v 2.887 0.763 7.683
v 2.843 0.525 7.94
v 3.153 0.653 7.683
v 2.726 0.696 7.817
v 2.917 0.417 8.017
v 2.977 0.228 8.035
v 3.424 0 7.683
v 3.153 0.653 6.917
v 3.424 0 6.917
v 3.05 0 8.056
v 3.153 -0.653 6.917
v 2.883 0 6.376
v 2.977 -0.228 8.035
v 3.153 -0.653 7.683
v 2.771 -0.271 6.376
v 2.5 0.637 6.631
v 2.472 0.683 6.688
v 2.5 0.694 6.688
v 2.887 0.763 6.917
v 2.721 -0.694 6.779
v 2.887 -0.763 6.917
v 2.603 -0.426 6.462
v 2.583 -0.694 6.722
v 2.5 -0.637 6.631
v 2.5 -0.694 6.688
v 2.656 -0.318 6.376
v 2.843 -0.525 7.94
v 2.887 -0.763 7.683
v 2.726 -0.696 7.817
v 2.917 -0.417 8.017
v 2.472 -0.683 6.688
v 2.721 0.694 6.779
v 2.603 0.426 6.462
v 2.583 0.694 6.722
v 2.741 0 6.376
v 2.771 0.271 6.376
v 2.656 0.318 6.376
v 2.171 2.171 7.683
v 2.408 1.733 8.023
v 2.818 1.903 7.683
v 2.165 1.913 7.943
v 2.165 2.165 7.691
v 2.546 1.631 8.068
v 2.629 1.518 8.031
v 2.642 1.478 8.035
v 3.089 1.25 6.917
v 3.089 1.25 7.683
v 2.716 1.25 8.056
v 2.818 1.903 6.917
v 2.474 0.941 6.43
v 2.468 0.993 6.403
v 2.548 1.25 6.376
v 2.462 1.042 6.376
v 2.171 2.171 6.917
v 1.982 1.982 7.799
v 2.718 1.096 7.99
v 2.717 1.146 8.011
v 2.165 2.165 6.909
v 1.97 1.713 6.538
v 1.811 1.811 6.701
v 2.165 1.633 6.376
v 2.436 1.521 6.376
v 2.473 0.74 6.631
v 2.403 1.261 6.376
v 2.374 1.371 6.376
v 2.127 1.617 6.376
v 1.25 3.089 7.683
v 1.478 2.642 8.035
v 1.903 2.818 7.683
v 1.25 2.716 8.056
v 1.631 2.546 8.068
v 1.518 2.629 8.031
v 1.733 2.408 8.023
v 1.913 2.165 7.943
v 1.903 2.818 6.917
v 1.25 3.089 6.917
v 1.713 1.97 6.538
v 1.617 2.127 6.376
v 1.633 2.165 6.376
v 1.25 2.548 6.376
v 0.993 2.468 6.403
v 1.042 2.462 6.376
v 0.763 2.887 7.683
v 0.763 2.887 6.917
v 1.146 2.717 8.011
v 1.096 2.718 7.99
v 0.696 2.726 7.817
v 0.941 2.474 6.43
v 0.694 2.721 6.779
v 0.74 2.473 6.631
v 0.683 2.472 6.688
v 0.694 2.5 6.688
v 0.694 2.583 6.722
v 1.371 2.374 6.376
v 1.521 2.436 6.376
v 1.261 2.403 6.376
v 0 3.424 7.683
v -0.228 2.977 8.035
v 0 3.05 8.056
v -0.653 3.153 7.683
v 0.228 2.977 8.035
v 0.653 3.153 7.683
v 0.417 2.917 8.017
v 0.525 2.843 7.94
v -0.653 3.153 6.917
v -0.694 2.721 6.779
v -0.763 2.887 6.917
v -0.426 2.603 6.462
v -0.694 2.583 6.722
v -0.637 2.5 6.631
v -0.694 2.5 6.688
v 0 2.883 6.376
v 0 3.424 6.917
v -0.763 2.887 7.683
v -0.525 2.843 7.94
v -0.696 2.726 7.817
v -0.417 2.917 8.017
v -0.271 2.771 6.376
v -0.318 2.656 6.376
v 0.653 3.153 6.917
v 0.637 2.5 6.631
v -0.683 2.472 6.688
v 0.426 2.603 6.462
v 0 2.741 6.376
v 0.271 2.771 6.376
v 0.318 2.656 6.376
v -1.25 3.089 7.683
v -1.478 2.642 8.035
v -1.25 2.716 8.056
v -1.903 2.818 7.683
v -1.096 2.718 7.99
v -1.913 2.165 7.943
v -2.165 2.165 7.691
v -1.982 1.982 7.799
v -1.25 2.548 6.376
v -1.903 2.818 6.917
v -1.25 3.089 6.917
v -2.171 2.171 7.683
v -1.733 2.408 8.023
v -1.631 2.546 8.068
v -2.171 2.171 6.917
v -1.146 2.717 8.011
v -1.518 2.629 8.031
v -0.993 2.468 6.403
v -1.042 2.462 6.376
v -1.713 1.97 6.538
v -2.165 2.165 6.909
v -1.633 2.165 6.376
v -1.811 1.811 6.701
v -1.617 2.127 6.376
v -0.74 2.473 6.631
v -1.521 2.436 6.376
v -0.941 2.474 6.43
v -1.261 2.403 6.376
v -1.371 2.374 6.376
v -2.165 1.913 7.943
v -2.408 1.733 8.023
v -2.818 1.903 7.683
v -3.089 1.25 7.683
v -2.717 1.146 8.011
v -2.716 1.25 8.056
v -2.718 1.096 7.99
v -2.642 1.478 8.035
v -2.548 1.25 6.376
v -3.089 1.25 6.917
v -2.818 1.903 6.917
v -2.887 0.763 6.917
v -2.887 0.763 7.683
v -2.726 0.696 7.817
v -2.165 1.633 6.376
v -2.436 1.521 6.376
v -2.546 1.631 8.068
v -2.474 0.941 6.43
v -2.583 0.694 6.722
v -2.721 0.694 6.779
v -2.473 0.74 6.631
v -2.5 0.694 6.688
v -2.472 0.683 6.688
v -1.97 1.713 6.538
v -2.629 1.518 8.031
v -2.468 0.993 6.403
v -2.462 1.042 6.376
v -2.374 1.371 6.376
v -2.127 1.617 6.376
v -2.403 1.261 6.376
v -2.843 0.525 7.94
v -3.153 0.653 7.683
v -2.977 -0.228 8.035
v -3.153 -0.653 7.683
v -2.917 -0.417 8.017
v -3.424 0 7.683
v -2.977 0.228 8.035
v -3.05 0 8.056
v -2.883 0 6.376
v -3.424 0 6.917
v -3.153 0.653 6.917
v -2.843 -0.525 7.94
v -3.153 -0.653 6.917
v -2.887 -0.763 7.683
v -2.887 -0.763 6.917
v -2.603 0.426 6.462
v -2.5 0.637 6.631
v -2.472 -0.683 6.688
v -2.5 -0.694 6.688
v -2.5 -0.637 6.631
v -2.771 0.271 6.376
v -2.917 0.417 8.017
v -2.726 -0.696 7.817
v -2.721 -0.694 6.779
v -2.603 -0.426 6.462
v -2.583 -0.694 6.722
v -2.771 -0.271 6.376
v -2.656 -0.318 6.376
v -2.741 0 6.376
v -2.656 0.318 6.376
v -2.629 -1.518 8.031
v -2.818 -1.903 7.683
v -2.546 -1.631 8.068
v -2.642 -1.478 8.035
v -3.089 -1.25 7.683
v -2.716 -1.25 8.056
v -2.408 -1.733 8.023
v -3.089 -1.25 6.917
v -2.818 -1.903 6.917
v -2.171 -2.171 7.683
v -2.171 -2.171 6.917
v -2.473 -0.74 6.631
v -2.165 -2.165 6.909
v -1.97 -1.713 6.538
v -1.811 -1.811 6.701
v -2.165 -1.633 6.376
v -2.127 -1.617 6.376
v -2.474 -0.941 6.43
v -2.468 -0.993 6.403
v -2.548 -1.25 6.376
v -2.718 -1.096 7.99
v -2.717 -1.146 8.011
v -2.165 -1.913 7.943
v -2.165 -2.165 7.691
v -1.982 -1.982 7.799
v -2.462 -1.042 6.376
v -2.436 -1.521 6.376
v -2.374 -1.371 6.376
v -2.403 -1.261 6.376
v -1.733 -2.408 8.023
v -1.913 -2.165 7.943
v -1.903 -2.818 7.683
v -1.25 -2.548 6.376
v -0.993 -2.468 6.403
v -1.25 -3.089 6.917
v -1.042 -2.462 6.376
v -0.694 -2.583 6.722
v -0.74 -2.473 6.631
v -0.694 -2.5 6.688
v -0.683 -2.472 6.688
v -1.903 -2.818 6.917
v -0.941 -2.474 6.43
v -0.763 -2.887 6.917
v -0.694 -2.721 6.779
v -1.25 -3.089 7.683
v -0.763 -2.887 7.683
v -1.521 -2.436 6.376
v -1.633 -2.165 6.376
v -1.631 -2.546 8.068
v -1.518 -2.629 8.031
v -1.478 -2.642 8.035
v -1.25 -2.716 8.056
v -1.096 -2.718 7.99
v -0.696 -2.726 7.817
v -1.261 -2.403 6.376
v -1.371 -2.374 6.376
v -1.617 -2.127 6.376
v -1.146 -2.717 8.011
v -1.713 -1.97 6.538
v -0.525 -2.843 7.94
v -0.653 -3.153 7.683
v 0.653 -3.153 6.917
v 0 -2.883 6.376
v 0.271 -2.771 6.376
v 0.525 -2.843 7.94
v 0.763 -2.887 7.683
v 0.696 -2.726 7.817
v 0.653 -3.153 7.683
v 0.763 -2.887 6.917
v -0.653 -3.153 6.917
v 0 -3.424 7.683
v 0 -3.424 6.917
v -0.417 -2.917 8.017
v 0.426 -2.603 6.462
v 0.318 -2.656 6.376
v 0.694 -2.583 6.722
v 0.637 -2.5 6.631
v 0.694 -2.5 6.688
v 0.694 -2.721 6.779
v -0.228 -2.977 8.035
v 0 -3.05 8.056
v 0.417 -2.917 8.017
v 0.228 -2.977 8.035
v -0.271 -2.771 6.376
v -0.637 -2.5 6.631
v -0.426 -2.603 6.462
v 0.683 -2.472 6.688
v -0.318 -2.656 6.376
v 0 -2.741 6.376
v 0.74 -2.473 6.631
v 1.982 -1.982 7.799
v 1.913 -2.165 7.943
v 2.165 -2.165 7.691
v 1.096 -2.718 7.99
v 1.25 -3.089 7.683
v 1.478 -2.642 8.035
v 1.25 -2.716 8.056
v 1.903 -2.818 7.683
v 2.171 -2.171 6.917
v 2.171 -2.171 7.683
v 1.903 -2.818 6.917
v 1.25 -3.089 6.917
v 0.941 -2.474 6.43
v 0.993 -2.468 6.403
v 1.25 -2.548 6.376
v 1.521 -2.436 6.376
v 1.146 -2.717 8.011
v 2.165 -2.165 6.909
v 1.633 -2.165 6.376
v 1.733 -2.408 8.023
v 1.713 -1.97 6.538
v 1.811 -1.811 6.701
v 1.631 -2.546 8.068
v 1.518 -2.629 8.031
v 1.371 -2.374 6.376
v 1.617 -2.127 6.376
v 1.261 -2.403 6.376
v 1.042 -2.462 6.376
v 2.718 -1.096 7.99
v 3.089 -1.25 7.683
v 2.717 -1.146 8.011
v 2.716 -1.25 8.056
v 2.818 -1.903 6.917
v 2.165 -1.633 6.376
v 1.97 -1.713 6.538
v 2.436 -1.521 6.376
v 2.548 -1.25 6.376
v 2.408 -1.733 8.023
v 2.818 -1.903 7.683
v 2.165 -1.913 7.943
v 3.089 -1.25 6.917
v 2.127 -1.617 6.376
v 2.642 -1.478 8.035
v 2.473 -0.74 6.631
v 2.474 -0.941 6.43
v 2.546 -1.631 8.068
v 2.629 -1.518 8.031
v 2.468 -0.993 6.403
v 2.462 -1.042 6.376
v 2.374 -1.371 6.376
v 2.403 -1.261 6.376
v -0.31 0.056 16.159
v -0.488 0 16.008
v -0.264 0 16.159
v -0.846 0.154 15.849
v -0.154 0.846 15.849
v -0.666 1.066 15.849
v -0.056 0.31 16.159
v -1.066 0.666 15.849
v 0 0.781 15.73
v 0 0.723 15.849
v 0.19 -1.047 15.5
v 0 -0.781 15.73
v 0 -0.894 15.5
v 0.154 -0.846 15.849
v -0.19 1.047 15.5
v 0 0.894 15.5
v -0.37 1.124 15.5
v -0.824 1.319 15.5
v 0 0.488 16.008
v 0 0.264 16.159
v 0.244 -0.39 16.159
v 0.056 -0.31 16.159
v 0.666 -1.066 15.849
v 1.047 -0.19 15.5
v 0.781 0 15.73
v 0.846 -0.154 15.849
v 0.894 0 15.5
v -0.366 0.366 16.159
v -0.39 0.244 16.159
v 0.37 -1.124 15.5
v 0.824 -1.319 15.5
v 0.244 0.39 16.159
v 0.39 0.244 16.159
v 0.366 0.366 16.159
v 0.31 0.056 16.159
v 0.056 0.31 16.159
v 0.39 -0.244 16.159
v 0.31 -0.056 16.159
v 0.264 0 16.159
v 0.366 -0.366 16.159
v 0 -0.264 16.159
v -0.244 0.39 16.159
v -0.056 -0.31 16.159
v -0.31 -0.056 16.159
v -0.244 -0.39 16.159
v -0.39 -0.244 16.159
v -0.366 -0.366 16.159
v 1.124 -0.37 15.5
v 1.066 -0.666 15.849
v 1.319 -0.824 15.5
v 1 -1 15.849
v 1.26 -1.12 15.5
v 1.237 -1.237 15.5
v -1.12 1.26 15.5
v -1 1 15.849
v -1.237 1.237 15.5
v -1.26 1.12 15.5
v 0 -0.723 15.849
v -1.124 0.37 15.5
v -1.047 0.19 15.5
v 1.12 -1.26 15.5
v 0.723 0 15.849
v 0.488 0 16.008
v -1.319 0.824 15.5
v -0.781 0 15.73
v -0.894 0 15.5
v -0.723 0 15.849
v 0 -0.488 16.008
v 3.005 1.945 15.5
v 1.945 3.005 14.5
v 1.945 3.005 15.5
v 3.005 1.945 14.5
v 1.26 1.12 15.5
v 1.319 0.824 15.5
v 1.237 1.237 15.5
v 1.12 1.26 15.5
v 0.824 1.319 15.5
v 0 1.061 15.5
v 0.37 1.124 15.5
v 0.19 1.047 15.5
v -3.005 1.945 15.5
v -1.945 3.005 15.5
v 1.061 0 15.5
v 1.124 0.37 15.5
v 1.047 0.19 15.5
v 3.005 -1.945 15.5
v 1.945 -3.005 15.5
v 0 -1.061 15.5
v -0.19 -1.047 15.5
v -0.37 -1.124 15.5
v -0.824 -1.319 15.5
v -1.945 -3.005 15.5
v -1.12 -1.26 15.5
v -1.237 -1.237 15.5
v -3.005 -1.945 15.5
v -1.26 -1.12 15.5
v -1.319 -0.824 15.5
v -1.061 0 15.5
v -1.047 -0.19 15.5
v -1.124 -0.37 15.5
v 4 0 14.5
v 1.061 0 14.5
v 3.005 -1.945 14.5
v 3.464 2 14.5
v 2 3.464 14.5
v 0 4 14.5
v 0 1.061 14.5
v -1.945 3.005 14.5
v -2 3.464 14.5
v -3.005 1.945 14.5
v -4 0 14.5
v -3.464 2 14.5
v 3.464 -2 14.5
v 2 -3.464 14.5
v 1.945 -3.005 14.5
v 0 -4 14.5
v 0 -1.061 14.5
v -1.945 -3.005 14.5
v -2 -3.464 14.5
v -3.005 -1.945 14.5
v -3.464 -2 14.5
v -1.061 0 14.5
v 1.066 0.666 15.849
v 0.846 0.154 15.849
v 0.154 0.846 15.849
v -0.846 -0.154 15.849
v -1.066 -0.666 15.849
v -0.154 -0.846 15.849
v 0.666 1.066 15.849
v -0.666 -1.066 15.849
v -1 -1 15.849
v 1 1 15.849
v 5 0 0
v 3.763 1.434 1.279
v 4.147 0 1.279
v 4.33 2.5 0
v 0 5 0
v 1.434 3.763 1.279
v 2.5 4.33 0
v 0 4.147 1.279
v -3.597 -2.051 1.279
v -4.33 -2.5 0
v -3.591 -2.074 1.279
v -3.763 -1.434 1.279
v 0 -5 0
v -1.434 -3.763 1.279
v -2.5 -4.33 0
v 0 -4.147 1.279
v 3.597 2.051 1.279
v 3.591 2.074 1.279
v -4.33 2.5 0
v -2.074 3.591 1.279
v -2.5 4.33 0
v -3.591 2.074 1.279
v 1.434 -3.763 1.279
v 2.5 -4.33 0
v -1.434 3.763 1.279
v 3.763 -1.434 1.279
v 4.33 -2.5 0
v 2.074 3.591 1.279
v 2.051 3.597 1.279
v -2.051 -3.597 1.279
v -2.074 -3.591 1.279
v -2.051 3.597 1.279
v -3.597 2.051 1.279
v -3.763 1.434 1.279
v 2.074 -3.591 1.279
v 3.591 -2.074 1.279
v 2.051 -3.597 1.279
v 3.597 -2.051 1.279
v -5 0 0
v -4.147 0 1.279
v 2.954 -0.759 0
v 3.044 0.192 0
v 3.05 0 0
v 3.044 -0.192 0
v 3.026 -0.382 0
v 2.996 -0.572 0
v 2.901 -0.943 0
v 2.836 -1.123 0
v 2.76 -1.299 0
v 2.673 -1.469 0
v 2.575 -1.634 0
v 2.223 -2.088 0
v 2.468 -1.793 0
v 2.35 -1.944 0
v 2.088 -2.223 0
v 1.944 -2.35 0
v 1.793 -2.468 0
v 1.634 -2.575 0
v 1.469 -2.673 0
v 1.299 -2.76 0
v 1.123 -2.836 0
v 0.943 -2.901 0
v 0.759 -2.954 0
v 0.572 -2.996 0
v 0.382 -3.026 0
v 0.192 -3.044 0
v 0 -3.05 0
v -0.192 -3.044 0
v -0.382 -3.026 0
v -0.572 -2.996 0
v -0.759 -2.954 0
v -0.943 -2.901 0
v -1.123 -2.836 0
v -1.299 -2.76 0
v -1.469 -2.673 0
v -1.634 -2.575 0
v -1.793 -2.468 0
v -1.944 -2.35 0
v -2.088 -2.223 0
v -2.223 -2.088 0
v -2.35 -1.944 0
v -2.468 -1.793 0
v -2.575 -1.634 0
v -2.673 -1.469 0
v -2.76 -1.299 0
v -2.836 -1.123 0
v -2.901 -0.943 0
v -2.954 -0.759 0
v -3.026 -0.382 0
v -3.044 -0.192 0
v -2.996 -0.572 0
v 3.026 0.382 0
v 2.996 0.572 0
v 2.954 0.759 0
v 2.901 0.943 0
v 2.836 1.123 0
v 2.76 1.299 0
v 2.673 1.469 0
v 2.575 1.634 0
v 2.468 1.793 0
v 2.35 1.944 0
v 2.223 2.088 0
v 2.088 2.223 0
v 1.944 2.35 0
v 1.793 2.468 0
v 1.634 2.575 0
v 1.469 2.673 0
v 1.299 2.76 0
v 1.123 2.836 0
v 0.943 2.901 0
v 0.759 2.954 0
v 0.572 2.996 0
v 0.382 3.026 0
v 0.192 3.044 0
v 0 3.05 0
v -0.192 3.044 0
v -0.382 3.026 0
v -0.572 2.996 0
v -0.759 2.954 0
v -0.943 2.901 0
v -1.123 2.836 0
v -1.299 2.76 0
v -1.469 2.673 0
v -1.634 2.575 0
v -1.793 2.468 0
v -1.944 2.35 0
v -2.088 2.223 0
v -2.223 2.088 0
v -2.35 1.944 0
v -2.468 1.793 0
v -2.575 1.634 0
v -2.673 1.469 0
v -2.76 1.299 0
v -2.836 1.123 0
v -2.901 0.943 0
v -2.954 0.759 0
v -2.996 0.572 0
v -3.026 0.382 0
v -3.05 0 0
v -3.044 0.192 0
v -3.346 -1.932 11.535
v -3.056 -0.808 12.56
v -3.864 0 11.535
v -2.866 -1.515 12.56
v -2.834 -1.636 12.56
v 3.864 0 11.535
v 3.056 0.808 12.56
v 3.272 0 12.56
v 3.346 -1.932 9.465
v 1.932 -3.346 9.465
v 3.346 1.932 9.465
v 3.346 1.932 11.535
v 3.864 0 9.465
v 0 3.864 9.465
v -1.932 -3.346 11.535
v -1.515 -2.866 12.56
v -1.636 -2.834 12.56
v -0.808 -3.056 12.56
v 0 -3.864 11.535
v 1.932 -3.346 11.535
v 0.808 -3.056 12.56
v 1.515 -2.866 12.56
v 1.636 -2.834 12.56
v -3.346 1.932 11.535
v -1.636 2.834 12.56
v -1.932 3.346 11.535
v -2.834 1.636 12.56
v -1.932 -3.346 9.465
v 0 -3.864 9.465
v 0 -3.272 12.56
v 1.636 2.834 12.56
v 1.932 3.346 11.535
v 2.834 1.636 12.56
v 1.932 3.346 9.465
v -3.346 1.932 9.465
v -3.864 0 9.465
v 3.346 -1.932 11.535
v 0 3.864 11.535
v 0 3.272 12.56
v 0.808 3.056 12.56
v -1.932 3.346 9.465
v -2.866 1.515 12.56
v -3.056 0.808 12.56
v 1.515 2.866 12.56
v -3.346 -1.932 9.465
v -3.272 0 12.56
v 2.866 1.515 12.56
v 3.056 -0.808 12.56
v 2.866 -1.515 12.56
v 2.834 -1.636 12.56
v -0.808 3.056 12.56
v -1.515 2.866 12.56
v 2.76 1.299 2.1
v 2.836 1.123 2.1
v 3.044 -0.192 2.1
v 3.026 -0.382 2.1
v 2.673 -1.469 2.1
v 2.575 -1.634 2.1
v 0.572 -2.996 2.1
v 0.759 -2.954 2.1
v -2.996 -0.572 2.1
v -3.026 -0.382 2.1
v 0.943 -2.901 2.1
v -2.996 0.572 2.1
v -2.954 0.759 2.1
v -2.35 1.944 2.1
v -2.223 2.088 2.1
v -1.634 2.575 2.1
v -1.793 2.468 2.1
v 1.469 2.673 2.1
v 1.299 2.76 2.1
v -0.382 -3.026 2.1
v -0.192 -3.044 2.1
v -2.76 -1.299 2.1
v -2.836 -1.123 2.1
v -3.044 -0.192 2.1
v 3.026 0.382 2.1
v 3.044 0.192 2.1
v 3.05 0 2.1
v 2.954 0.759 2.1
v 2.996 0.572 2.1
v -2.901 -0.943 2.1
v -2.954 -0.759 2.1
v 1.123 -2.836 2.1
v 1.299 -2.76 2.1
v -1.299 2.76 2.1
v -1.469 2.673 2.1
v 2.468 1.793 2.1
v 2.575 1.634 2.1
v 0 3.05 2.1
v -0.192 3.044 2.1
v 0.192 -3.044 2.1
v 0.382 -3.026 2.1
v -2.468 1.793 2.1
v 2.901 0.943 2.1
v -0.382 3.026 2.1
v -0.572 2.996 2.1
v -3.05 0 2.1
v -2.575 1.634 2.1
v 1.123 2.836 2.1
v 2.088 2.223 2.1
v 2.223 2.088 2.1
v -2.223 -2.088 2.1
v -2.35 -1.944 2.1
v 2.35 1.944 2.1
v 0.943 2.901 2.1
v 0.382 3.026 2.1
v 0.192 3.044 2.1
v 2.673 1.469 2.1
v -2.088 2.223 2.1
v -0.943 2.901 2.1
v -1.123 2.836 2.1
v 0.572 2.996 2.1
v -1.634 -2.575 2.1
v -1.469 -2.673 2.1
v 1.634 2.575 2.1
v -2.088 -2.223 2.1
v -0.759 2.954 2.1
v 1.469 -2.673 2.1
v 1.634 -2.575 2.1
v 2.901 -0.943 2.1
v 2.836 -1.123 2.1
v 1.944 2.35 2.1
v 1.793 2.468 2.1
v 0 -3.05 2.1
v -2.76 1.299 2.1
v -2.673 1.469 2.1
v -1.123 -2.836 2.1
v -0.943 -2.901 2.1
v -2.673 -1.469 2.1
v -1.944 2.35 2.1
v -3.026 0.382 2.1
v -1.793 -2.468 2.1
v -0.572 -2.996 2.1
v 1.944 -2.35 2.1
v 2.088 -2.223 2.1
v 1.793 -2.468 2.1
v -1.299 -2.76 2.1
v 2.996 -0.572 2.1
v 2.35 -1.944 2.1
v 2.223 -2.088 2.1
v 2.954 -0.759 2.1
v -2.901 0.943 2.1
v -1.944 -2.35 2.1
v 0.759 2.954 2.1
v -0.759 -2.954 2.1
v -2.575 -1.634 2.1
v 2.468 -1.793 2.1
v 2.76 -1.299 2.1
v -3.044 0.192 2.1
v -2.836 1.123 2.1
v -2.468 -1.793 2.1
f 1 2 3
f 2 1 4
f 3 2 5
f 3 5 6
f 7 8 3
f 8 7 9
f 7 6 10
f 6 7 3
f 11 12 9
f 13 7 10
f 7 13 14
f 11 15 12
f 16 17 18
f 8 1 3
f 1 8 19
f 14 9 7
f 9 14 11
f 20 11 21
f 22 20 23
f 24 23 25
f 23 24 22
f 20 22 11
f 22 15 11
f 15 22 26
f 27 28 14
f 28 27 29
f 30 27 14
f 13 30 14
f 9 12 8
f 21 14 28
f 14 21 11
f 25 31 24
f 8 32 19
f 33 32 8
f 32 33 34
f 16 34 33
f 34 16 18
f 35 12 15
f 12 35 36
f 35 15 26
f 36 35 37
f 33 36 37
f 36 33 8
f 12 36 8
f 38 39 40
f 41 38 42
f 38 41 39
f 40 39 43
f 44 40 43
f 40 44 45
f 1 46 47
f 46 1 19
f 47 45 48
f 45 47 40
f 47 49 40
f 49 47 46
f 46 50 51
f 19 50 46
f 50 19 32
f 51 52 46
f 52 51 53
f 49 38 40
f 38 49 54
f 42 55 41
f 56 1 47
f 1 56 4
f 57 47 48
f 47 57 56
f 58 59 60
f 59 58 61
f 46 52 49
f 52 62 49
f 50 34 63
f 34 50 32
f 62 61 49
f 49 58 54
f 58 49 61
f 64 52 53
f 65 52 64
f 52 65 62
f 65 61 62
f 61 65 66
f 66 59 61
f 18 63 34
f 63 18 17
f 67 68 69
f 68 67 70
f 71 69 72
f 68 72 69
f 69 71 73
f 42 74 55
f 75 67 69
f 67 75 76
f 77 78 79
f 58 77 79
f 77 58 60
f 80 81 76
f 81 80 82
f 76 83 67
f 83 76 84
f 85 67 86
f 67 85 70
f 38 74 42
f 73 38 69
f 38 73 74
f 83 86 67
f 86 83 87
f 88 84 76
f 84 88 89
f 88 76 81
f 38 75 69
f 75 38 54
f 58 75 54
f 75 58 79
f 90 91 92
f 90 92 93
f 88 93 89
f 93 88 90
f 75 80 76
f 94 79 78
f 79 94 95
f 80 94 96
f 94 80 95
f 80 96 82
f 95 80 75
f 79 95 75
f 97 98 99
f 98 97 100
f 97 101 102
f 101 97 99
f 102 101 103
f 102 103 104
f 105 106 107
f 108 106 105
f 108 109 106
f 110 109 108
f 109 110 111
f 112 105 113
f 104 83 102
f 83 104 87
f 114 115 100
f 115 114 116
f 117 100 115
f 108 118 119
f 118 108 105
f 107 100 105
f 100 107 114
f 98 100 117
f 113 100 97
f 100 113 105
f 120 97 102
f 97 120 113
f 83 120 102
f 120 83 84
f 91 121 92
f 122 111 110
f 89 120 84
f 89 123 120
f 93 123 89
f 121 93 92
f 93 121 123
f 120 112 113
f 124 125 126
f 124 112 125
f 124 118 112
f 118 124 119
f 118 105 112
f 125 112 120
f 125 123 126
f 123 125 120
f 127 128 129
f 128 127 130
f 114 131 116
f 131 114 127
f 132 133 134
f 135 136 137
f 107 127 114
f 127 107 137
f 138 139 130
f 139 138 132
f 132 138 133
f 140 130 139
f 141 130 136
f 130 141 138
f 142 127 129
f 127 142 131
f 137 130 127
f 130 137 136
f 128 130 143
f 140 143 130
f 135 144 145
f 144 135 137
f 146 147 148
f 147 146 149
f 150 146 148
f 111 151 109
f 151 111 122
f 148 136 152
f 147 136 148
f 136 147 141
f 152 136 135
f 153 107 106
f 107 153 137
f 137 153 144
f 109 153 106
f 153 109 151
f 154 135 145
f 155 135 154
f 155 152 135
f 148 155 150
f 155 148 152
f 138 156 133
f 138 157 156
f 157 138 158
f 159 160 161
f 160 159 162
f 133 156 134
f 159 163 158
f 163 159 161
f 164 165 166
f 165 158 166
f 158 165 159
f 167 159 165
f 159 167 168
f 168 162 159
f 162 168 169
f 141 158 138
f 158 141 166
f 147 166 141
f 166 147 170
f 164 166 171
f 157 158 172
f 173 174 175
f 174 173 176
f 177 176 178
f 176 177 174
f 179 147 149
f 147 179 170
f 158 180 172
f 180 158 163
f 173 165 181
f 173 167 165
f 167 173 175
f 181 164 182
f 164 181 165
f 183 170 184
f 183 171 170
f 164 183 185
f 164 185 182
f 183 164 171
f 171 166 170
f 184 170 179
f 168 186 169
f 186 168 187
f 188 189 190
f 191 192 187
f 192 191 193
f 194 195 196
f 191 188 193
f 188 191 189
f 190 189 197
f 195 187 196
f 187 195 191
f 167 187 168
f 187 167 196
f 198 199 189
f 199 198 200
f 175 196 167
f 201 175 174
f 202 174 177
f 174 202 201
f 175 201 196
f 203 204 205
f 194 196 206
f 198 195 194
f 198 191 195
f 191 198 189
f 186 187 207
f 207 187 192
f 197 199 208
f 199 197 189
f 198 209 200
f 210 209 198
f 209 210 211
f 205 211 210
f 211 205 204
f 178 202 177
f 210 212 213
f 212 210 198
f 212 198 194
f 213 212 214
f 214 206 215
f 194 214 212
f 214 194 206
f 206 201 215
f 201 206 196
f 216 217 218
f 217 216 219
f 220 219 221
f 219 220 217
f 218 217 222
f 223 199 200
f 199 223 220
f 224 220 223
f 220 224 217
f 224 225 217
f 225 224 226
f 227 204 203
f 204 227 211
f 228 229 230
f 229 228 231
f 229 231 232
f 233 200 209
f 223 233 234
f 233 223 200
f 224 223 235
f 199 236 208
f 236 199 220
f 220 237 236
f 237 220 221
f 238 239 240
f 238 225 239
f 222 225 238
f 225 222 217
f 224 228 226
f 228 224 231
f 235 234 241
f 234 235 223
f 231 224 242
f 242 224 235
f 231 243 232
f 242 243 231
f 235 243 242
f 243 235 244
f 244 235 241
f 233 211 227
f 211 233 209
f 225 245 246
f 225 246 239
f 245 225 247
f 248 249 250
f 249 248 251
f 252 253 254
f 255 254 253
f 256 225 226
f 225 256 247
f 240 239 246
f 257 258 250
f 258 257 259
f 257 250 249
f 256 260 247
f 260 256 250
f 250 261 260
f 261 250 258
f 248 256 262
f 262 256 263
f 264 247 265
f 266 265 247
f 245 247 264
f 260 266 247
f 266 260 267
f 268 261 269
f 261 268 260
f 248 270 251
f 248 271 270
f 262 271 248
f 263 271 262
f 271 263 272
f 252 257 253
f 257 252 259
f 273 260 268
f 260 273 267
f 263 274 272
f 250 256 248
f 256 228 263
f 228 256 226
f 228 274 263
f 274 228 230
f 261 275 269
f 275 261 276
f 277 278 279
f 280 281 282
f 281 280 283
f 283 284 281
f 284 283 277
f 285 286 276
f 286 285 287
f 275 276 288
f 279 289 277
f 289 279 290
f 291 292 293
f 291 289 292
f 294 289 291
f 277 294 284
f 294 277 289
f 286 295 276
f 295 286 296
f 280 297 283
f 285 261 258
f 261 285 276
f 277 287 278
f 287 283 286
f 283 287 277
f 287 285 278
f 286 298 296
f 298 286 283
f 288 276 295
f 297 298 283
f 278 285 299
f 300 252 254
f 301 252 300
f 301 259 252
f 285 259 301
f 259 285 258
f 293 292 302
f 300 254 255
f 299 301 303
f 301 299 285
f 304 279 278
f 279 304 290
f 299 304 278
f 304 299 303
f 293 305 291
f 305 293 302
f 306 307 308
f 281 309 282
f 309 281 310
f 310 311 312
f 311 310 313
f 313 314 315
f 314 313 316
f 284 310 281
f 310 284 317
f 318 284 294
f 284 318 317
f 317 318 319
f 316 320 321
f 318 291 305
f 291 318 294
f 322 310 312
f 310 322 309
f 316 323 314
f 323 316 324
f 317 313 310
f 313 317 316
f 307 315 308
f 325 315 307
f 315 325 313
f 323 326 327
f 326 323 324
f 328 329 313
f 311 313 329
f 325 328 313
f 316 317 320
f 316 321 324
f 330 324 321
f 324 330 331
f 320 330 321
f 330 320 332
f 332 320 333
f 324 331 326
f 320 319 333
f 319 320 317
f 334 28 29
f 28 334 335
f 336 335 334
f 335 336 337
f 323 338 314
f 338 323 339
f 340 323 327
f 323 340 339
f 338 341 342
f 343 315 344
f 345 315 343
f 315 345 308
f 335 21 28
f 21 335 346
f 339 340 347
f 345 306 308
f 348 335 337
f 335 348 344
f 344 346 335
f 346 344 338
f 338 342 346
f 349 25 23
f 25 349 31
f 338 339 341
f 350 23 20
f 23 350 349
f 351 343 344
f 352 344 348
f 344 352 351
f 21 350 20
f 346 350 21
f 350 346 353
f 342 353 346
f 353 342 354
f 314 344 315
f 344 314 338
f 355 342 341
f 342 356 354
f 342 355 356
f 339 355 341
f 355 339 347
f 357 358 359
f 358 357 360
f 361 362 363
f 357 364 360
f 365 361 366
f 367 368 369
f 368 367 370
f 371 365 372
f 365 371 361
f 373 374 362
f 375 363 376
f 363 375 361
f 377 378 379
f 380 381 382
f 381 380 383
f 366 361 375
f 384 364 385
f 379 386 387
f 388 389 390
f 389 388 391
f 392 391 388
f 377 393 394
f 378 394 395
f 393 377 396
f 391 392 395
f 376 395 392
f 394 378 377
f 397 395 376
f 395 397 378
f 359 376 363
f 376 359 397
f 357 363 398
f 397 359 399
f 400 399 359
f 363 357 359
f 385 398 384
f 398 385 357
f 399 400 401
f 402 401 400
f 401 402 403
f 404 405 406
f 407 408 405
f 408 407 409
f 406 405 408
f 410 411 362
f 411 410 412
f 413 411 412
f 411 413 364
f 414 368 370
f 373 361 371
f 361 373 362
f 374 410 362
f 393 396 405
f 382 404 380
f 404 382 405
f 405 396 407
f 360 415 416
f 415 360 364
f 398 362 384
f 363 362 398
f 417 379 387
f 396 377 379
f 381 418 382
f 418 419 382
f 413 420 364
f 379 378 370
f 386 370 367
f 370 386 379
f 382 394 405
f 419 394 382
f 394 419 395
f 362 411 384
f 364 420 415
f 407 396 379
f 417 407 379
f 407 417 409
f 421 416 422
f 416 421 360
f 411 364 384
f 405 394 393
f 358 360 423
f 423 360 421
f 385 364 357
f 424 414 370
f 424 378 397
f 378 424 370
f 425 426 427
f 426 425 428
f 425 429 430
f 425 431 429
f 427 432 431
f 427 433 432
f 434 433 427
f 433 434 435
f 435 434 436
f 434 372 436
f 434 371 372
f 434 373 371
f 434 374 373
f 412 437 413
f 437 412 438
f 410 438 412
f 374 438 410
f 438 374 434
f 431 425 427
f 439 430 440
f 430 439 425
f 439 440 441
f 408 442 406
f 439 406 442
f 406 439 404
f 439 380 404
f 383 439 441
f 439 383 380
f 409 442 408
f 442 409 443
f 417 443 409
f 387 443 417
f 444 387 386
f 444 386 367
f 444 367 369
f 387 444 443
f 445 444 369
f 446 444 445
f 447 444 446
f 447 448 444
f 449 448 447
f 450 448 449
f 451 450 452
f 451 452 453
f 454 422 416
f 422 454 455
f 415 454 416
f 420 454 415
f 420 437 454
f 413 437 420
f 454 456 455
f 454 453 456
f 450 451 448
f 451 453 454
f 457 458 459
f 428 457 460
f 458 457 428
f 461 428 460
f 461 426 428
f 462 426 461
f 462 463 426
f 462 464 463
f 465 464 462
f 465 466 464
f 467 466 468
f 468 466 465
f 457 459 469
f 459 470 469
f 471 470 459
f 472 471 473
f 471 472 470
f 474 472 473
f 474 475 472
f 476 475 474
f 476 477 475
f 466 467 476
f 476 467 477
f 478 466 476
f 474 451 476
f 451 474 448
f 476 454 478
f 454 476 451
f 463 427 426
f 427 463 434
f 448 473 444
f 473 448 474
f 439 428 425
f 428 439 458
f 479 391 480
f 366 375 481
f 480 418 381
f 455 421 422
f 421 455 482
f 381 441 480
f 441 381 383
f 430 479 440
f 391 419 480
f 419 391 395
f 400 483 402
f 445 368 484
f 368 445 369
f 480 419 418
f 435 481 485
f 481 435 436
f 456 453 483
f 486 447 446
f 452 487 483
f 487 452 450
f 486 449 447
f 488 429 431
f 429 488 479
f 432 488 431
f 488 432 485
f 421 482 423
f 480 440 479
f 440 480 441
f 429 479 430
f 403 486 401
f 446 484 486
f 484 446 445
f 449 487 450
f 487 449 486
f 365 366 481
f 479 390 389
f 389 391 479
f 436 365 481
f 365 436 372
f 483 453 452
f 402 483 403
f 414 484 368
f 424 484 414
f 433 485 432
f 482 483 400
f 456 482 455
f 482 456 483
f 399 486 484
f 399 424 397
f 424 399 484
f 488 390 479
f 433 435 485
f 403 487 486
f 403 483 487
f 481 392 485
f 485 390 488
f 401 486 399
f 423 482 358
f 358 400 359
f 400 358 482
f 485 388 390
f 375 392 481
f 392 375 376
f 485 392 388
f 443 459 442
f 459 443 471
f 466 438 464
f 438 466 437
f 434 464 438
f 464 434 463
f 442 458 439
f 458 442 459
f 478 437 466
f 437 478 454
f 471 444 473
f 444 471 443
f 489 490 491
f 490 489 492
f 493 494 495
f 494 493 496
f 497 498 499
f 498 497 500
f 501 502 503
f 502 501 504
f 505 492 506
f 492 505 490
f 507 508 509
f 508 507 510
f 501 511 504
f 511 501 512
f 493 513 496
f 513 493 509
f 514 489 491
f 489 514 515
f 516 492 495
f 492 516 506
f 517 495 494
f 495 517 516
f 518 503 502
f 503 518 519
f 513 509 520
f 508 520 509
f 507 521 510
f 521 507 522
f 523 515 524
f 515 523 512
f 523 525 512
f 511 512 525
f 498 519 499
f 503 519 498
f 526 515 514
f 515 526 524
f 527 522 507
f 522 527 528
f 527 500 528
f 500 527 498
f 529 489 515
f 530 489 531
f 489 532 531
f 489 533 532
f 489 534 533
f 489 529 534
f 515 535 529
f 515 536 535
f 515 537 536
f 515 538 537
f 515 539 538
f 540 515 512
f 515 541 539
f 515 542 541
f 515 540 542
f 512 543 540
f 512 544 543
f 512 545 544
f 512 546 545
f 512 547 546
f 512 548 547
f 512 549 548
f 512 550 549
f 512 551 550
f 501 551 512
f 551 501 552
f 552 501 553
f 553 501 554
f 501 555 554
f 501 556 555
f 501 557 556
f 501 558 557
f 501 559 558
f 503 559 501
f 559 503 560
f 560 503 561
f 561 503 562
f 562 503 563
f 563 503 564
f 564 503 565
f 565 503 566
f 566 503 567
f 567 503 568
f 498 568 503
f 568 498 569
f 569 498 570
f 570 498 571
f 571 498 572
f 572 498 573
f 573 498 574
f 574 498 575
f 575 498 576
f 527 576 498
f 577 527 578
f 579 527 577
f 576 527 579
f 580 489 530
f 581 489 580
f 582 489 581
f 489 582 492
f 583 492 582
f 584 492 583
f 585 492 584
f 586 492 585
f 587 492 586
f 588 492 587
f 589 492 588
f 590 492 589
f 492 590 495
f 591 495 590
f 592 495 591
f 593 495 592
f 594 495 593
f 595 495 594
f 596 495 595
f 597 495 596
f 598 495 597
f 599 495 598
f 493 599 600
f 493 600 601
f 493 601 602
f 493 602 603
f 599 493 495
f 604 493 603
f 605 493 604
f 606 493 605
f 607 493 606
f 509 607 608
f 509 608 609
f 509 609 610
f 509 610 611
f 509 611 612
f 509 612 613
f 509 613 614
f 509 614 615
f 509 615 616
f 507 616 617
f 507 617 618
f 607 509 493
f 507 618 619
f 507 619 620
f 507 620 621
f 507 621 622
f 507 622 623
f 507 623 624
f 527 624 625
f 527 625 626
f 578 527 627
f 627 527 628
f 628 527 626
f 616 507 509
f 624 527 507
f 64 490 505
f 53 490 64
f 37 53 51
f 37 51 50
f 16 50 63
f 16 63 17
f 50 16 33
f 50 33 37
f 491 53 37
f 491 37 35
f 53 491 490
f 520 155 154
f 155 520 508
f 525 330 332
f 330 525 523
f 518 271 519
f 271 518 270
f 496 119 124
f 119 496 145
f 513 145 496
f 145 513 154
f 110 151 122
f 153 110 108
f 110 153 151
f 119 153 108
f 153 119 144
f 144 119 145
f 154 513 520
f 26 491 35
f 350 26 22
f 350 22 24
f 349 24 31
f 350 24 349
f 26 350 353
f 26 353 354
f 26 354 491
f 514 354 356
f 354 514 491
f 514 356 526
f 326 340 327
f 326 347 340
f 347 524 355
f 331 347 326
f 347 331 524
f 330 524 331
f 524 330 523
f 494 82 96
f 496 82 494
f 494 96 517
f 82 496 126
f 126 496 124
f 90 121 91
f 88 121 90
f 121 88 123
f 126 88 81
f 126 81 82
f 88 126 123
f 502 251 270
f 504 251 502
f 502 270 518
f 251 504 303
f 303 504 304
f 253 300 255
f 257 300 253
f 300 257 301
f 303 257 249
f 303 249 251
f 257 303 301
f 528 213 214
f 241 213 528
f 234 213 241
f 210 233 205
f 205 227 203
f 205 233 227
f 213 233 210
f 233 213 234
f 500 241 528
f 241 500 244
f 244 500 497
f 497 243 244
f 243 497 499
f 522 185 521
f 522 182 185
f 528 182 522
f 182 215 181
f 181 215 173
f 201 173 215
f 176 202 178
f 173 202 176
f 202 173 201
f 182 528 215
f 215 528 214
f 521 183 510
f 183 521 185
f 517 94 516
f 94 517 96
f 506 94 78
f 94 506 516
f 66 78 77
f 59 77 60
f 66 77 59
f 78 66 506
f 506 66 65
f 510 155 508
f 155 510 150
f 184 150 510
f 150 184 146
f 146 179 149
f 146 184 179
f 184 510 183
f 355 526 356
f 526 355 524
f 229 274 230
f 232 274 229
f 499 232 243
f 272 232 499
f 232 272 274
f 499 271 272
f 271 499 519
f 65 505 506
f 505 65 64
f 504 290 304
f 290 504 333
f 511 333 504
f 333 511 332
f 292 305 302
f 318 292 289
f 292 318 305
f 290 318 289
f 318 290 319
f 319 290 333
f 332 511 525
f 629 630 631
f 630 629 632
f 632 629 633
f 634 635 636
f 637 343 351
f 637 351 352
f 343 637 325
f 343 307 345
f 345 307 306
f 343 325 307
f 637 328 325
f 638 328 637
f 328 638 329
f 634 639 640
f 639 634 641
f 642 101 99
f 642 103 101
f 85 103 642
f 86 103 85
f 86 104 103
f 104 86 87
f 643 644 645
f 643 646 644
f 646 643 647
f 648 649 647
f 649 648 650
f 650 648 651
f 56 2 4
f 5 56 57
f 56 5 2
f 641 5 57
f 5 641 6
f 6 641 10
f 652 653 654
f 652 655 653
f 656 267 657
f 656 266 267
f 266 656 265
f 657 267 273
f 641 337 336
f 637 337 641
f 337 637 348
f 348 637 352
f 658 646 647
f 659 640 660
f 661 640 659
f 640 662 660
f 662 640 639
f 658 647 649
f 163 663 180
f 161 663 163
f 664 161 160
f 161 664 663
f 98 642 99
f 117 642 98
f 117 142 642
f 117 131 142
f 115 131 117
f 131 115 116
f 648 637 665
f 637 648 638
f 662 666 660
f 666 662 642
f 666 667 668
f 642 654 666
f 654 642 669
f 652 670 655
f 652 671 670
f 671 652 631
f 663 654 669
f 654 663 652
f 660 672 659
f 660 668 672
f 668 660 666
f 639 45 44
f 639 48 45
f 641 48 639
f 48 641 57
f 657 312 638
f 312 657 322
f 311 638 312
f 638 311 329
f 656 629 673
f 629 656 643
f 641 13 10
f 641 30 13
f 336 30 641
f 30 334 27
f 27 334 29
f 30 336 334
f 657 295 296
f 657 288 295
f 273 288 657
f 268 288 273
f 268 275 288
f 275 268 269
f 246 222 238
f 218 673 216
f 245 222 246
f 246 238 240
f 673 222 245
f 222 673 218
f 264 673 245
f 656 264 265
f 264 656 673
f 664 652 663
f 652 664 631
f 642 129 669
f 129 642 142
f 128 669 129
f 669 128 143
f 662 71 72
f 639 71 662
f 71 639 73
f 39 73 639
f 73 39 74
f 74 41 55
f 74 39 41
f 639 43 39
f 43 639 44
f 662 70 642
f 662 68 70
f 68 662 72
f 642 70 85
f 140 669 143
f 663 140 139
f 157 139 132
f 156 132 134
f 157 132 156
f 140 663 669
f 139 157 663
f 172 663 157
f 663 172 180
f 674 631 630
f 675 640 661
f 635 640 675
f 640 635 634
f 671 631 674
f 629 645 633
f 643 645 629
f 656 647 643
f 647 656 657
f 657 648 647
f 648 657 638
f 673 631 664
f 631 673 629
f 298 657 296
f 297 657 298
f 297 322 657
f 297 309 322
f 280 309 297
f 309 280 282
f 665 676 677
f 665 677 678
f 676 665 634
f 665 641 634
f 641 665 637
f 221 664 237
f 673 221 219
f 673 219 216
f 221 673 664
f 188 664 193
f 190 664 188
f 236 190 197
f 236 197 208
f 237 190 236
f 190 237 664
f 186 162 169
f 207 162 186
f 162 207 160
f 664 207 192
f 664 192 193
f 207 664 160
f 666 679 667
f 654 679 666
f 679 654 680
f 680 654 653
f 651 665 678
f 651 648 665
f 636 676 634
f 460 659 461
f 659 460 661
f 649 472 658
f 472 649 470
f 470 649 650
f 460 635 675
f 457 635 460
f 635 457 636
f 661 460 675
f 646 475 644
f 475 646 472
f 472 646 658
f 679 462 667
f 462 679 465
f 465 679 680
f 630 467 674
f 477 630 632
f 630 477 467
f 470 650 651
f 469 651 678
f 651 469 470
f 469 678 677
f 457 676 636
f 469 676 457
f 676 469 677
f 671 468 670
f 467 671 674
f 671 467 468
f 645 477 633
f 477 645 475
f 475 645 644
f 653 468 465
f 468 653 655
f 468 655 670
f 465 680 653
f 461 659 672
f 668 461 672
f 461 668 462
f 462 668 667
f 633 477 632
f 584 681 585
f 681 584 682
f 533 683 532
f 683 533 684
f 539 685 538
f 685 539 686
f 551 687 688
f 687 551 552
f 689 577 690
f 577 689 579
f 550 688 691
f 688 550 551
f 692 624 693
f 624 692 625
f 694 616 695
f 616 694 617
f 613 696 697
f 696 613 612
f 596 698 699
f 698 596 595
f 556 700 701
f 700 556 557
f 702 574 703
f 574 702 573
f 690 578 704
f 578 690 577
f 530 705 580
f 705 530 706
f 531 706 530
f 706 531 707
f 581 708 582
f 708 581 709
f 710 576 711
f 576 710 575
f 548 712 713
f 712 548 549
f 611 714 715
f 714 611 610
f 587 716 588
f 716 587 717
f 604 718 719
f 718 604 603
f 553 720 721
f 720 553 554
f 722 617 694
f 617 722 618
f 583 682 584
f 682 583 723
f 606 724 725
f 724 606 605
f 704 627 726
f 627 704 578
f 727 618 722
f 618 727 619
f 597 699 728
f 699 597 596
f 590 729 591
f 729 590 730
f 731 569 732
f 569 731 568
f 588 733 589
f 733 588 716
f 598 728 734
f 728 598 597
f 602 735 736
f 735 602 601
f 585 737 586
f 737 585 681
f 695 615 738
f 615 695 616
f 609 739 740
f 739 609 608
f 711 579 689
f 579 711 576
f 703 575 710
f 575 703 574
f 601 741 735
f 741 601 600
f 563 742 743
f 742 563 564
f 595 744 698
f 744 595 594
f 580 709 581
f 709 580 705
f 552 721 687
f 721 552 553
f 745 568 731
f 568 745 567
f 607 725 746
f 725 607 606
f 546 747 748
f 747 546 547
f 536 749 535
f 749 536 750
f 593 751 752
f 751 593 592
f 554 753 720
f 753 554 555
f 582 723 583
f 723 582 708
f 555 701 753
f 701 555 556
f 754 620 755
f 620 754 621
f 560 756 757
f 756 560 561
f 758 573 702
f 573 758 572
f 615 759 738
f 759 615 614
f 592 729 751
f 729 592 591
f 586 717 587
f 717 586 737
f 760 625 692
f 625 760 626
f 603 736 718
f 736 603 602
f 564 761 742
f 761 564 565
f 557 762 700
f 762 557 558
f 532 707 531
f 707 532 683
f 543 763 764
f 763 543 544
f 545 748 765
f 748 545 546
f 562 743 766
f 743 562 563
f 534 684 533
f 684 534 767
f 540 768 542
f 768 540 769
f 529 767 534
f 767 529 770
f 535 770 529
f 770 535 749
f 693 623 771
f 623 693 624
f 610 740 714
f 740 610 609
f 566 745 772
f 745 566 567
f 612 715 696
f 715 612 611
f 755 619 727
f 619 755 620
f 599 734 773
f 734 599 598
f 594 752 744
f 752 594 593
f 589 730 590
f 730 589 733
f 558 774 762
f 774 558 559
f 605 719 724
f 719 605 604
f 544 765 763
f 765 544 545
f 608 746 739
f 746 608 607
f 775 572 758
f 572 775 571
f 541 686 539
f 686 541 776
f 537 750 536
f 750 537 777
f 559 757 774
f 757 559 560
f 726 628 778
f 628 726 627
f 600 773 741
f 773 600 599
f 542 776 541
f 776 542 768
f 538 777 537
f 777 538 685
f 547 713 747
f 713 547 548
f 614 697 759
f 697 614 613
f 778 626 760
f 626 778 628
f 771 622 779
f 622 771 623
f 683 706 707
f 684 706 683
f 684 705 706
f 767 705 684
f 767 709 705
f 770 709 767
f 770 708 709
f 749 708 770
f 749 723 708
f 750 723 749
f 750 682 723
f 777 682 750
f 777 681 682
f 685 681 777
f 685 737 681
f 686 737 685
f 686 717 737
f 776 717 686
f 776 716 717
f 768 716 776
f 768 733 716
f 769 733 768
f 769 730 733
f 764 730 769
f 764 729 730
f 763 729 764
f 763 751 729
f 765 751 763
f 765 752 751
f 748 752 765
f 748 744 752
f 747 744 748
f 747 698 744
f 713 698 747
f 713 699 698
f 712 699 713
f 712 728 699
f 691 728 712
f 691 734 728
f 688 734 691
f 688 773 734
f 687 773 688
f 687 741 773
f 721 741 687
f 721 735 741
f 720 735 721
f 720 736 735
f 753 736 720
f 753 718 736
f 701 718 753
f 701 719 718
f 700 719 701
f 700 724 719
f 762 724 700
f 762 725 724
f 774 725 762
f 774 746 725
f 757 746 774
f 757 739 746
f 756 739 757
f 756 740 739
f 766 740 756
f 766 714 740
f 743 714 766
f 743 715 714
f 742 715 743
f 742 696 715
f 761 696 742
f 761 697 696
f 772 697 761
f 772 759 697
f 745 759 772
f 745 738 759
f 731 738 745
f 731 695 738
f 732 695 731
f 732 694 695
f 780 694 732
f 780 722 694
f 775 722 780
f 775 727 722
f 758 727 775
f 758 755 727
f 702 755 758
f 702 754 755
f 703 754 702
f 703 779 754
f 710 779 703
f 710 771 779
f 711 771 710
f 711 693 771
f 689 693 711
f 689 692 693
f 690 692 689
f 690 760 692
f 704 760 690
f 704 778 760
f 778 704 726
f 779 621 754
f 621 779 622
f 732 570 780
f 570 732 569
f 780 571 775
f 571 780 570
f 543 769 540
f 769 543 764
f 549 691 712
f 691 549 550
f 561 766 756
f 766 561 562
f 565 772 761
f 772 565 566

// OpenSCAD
/*
King Piece Generator
*/

// Parameters
$fn = 12; // Number of faces (moderate poly)

magnet_height = 2.1;       // Magnet height
magnet_radius = 3.05;      // Magnet radius

body_height = 14.5;        // Main body height
body_radius = 4.5;         // Body base radius

head_radius = 4;           // Head sphere radius
base_flare_radius = 5;     // Base flare radius (rim at bottom)
base_flare_height = 3;     // Base flare height

transparency = 5;          // Transparency level
color_rgb = [143, 255, 61]; // RGB color (0–255)

/*
Optional: bounding box for visualizing max dimensions
module bounds() {
    color("red", 0.3)
        cube([6, 1, 17]); // Max size (W × D × H)
}
*/

// Decorative ring of spheres (e.g., crown base)
module ring_of_spheres(n = 12, radius = 2.5, sphere_radius = 1) {
    for (i = [0 : n - 1]) {
        angle = 360 / n * i;
        translate([radius * cos(angle), radius * sin(angle), 0])
            sphere(r = sphere_radius, $fn = 8);
    }
}

// Main model: King piece
module king() {
    union() {
        color(color_rgb / 255, transparency) {

            // Flared base (for stability/decor)
            cylinder(h = base_flare_height, r1 = base_flare_radius, r2 = base_flare_radius - 2, center = false);

            // Tapered body
            cylinder(h = body_height, r1 = body_radius, r2 = body_radius - 4, center = false);

            // Head (sphere)
            translate([0, 0, body_height - 4])
                sphere(r = head_radius);

            // Decorative crown ring (around head)
            translate([0, 0, body_height - 7.2])
                ring_of_spheres(n = 12, radius = 2.5, sphere_radius = 1);

            // Crown cone
            translate([0, 0, body_height - 4])
                cylinder(h = 8, r1 = 1, r2 = 4, center = true);

            // Crown spikes (cross-like decoration)
            translate([0, 0, body_height + 0.5]) {

                // First arm
                rotate([0, 0, 45]) {
                    scale([0.8, 2, 1.2])
                        sphere(r = 1);
                    cube([7, 1.5, 1], center = true);
                }

                // Second arm (perpendicular)
                rotate([0, 0, 315]) {
                    scale([0.8, 2, 1.2])
                        sphere(r = 1);
                    cube([7, 1.5, 1], center = true);
                }
            }
        }
    }
}

// Magnet cavity (subtract from base)
module magnet_cavity() {
    offset = 0.5;
    translate([0, 0, -offset]) {
        color("yellow", transparency)
            cylinder(h = magnet_height + offset, r = magnet_radius, center = false, $fn = 100);
    }
}

// Final output: king with magnet cavity
difference() {
    king();
    magnet_cavity();
}
